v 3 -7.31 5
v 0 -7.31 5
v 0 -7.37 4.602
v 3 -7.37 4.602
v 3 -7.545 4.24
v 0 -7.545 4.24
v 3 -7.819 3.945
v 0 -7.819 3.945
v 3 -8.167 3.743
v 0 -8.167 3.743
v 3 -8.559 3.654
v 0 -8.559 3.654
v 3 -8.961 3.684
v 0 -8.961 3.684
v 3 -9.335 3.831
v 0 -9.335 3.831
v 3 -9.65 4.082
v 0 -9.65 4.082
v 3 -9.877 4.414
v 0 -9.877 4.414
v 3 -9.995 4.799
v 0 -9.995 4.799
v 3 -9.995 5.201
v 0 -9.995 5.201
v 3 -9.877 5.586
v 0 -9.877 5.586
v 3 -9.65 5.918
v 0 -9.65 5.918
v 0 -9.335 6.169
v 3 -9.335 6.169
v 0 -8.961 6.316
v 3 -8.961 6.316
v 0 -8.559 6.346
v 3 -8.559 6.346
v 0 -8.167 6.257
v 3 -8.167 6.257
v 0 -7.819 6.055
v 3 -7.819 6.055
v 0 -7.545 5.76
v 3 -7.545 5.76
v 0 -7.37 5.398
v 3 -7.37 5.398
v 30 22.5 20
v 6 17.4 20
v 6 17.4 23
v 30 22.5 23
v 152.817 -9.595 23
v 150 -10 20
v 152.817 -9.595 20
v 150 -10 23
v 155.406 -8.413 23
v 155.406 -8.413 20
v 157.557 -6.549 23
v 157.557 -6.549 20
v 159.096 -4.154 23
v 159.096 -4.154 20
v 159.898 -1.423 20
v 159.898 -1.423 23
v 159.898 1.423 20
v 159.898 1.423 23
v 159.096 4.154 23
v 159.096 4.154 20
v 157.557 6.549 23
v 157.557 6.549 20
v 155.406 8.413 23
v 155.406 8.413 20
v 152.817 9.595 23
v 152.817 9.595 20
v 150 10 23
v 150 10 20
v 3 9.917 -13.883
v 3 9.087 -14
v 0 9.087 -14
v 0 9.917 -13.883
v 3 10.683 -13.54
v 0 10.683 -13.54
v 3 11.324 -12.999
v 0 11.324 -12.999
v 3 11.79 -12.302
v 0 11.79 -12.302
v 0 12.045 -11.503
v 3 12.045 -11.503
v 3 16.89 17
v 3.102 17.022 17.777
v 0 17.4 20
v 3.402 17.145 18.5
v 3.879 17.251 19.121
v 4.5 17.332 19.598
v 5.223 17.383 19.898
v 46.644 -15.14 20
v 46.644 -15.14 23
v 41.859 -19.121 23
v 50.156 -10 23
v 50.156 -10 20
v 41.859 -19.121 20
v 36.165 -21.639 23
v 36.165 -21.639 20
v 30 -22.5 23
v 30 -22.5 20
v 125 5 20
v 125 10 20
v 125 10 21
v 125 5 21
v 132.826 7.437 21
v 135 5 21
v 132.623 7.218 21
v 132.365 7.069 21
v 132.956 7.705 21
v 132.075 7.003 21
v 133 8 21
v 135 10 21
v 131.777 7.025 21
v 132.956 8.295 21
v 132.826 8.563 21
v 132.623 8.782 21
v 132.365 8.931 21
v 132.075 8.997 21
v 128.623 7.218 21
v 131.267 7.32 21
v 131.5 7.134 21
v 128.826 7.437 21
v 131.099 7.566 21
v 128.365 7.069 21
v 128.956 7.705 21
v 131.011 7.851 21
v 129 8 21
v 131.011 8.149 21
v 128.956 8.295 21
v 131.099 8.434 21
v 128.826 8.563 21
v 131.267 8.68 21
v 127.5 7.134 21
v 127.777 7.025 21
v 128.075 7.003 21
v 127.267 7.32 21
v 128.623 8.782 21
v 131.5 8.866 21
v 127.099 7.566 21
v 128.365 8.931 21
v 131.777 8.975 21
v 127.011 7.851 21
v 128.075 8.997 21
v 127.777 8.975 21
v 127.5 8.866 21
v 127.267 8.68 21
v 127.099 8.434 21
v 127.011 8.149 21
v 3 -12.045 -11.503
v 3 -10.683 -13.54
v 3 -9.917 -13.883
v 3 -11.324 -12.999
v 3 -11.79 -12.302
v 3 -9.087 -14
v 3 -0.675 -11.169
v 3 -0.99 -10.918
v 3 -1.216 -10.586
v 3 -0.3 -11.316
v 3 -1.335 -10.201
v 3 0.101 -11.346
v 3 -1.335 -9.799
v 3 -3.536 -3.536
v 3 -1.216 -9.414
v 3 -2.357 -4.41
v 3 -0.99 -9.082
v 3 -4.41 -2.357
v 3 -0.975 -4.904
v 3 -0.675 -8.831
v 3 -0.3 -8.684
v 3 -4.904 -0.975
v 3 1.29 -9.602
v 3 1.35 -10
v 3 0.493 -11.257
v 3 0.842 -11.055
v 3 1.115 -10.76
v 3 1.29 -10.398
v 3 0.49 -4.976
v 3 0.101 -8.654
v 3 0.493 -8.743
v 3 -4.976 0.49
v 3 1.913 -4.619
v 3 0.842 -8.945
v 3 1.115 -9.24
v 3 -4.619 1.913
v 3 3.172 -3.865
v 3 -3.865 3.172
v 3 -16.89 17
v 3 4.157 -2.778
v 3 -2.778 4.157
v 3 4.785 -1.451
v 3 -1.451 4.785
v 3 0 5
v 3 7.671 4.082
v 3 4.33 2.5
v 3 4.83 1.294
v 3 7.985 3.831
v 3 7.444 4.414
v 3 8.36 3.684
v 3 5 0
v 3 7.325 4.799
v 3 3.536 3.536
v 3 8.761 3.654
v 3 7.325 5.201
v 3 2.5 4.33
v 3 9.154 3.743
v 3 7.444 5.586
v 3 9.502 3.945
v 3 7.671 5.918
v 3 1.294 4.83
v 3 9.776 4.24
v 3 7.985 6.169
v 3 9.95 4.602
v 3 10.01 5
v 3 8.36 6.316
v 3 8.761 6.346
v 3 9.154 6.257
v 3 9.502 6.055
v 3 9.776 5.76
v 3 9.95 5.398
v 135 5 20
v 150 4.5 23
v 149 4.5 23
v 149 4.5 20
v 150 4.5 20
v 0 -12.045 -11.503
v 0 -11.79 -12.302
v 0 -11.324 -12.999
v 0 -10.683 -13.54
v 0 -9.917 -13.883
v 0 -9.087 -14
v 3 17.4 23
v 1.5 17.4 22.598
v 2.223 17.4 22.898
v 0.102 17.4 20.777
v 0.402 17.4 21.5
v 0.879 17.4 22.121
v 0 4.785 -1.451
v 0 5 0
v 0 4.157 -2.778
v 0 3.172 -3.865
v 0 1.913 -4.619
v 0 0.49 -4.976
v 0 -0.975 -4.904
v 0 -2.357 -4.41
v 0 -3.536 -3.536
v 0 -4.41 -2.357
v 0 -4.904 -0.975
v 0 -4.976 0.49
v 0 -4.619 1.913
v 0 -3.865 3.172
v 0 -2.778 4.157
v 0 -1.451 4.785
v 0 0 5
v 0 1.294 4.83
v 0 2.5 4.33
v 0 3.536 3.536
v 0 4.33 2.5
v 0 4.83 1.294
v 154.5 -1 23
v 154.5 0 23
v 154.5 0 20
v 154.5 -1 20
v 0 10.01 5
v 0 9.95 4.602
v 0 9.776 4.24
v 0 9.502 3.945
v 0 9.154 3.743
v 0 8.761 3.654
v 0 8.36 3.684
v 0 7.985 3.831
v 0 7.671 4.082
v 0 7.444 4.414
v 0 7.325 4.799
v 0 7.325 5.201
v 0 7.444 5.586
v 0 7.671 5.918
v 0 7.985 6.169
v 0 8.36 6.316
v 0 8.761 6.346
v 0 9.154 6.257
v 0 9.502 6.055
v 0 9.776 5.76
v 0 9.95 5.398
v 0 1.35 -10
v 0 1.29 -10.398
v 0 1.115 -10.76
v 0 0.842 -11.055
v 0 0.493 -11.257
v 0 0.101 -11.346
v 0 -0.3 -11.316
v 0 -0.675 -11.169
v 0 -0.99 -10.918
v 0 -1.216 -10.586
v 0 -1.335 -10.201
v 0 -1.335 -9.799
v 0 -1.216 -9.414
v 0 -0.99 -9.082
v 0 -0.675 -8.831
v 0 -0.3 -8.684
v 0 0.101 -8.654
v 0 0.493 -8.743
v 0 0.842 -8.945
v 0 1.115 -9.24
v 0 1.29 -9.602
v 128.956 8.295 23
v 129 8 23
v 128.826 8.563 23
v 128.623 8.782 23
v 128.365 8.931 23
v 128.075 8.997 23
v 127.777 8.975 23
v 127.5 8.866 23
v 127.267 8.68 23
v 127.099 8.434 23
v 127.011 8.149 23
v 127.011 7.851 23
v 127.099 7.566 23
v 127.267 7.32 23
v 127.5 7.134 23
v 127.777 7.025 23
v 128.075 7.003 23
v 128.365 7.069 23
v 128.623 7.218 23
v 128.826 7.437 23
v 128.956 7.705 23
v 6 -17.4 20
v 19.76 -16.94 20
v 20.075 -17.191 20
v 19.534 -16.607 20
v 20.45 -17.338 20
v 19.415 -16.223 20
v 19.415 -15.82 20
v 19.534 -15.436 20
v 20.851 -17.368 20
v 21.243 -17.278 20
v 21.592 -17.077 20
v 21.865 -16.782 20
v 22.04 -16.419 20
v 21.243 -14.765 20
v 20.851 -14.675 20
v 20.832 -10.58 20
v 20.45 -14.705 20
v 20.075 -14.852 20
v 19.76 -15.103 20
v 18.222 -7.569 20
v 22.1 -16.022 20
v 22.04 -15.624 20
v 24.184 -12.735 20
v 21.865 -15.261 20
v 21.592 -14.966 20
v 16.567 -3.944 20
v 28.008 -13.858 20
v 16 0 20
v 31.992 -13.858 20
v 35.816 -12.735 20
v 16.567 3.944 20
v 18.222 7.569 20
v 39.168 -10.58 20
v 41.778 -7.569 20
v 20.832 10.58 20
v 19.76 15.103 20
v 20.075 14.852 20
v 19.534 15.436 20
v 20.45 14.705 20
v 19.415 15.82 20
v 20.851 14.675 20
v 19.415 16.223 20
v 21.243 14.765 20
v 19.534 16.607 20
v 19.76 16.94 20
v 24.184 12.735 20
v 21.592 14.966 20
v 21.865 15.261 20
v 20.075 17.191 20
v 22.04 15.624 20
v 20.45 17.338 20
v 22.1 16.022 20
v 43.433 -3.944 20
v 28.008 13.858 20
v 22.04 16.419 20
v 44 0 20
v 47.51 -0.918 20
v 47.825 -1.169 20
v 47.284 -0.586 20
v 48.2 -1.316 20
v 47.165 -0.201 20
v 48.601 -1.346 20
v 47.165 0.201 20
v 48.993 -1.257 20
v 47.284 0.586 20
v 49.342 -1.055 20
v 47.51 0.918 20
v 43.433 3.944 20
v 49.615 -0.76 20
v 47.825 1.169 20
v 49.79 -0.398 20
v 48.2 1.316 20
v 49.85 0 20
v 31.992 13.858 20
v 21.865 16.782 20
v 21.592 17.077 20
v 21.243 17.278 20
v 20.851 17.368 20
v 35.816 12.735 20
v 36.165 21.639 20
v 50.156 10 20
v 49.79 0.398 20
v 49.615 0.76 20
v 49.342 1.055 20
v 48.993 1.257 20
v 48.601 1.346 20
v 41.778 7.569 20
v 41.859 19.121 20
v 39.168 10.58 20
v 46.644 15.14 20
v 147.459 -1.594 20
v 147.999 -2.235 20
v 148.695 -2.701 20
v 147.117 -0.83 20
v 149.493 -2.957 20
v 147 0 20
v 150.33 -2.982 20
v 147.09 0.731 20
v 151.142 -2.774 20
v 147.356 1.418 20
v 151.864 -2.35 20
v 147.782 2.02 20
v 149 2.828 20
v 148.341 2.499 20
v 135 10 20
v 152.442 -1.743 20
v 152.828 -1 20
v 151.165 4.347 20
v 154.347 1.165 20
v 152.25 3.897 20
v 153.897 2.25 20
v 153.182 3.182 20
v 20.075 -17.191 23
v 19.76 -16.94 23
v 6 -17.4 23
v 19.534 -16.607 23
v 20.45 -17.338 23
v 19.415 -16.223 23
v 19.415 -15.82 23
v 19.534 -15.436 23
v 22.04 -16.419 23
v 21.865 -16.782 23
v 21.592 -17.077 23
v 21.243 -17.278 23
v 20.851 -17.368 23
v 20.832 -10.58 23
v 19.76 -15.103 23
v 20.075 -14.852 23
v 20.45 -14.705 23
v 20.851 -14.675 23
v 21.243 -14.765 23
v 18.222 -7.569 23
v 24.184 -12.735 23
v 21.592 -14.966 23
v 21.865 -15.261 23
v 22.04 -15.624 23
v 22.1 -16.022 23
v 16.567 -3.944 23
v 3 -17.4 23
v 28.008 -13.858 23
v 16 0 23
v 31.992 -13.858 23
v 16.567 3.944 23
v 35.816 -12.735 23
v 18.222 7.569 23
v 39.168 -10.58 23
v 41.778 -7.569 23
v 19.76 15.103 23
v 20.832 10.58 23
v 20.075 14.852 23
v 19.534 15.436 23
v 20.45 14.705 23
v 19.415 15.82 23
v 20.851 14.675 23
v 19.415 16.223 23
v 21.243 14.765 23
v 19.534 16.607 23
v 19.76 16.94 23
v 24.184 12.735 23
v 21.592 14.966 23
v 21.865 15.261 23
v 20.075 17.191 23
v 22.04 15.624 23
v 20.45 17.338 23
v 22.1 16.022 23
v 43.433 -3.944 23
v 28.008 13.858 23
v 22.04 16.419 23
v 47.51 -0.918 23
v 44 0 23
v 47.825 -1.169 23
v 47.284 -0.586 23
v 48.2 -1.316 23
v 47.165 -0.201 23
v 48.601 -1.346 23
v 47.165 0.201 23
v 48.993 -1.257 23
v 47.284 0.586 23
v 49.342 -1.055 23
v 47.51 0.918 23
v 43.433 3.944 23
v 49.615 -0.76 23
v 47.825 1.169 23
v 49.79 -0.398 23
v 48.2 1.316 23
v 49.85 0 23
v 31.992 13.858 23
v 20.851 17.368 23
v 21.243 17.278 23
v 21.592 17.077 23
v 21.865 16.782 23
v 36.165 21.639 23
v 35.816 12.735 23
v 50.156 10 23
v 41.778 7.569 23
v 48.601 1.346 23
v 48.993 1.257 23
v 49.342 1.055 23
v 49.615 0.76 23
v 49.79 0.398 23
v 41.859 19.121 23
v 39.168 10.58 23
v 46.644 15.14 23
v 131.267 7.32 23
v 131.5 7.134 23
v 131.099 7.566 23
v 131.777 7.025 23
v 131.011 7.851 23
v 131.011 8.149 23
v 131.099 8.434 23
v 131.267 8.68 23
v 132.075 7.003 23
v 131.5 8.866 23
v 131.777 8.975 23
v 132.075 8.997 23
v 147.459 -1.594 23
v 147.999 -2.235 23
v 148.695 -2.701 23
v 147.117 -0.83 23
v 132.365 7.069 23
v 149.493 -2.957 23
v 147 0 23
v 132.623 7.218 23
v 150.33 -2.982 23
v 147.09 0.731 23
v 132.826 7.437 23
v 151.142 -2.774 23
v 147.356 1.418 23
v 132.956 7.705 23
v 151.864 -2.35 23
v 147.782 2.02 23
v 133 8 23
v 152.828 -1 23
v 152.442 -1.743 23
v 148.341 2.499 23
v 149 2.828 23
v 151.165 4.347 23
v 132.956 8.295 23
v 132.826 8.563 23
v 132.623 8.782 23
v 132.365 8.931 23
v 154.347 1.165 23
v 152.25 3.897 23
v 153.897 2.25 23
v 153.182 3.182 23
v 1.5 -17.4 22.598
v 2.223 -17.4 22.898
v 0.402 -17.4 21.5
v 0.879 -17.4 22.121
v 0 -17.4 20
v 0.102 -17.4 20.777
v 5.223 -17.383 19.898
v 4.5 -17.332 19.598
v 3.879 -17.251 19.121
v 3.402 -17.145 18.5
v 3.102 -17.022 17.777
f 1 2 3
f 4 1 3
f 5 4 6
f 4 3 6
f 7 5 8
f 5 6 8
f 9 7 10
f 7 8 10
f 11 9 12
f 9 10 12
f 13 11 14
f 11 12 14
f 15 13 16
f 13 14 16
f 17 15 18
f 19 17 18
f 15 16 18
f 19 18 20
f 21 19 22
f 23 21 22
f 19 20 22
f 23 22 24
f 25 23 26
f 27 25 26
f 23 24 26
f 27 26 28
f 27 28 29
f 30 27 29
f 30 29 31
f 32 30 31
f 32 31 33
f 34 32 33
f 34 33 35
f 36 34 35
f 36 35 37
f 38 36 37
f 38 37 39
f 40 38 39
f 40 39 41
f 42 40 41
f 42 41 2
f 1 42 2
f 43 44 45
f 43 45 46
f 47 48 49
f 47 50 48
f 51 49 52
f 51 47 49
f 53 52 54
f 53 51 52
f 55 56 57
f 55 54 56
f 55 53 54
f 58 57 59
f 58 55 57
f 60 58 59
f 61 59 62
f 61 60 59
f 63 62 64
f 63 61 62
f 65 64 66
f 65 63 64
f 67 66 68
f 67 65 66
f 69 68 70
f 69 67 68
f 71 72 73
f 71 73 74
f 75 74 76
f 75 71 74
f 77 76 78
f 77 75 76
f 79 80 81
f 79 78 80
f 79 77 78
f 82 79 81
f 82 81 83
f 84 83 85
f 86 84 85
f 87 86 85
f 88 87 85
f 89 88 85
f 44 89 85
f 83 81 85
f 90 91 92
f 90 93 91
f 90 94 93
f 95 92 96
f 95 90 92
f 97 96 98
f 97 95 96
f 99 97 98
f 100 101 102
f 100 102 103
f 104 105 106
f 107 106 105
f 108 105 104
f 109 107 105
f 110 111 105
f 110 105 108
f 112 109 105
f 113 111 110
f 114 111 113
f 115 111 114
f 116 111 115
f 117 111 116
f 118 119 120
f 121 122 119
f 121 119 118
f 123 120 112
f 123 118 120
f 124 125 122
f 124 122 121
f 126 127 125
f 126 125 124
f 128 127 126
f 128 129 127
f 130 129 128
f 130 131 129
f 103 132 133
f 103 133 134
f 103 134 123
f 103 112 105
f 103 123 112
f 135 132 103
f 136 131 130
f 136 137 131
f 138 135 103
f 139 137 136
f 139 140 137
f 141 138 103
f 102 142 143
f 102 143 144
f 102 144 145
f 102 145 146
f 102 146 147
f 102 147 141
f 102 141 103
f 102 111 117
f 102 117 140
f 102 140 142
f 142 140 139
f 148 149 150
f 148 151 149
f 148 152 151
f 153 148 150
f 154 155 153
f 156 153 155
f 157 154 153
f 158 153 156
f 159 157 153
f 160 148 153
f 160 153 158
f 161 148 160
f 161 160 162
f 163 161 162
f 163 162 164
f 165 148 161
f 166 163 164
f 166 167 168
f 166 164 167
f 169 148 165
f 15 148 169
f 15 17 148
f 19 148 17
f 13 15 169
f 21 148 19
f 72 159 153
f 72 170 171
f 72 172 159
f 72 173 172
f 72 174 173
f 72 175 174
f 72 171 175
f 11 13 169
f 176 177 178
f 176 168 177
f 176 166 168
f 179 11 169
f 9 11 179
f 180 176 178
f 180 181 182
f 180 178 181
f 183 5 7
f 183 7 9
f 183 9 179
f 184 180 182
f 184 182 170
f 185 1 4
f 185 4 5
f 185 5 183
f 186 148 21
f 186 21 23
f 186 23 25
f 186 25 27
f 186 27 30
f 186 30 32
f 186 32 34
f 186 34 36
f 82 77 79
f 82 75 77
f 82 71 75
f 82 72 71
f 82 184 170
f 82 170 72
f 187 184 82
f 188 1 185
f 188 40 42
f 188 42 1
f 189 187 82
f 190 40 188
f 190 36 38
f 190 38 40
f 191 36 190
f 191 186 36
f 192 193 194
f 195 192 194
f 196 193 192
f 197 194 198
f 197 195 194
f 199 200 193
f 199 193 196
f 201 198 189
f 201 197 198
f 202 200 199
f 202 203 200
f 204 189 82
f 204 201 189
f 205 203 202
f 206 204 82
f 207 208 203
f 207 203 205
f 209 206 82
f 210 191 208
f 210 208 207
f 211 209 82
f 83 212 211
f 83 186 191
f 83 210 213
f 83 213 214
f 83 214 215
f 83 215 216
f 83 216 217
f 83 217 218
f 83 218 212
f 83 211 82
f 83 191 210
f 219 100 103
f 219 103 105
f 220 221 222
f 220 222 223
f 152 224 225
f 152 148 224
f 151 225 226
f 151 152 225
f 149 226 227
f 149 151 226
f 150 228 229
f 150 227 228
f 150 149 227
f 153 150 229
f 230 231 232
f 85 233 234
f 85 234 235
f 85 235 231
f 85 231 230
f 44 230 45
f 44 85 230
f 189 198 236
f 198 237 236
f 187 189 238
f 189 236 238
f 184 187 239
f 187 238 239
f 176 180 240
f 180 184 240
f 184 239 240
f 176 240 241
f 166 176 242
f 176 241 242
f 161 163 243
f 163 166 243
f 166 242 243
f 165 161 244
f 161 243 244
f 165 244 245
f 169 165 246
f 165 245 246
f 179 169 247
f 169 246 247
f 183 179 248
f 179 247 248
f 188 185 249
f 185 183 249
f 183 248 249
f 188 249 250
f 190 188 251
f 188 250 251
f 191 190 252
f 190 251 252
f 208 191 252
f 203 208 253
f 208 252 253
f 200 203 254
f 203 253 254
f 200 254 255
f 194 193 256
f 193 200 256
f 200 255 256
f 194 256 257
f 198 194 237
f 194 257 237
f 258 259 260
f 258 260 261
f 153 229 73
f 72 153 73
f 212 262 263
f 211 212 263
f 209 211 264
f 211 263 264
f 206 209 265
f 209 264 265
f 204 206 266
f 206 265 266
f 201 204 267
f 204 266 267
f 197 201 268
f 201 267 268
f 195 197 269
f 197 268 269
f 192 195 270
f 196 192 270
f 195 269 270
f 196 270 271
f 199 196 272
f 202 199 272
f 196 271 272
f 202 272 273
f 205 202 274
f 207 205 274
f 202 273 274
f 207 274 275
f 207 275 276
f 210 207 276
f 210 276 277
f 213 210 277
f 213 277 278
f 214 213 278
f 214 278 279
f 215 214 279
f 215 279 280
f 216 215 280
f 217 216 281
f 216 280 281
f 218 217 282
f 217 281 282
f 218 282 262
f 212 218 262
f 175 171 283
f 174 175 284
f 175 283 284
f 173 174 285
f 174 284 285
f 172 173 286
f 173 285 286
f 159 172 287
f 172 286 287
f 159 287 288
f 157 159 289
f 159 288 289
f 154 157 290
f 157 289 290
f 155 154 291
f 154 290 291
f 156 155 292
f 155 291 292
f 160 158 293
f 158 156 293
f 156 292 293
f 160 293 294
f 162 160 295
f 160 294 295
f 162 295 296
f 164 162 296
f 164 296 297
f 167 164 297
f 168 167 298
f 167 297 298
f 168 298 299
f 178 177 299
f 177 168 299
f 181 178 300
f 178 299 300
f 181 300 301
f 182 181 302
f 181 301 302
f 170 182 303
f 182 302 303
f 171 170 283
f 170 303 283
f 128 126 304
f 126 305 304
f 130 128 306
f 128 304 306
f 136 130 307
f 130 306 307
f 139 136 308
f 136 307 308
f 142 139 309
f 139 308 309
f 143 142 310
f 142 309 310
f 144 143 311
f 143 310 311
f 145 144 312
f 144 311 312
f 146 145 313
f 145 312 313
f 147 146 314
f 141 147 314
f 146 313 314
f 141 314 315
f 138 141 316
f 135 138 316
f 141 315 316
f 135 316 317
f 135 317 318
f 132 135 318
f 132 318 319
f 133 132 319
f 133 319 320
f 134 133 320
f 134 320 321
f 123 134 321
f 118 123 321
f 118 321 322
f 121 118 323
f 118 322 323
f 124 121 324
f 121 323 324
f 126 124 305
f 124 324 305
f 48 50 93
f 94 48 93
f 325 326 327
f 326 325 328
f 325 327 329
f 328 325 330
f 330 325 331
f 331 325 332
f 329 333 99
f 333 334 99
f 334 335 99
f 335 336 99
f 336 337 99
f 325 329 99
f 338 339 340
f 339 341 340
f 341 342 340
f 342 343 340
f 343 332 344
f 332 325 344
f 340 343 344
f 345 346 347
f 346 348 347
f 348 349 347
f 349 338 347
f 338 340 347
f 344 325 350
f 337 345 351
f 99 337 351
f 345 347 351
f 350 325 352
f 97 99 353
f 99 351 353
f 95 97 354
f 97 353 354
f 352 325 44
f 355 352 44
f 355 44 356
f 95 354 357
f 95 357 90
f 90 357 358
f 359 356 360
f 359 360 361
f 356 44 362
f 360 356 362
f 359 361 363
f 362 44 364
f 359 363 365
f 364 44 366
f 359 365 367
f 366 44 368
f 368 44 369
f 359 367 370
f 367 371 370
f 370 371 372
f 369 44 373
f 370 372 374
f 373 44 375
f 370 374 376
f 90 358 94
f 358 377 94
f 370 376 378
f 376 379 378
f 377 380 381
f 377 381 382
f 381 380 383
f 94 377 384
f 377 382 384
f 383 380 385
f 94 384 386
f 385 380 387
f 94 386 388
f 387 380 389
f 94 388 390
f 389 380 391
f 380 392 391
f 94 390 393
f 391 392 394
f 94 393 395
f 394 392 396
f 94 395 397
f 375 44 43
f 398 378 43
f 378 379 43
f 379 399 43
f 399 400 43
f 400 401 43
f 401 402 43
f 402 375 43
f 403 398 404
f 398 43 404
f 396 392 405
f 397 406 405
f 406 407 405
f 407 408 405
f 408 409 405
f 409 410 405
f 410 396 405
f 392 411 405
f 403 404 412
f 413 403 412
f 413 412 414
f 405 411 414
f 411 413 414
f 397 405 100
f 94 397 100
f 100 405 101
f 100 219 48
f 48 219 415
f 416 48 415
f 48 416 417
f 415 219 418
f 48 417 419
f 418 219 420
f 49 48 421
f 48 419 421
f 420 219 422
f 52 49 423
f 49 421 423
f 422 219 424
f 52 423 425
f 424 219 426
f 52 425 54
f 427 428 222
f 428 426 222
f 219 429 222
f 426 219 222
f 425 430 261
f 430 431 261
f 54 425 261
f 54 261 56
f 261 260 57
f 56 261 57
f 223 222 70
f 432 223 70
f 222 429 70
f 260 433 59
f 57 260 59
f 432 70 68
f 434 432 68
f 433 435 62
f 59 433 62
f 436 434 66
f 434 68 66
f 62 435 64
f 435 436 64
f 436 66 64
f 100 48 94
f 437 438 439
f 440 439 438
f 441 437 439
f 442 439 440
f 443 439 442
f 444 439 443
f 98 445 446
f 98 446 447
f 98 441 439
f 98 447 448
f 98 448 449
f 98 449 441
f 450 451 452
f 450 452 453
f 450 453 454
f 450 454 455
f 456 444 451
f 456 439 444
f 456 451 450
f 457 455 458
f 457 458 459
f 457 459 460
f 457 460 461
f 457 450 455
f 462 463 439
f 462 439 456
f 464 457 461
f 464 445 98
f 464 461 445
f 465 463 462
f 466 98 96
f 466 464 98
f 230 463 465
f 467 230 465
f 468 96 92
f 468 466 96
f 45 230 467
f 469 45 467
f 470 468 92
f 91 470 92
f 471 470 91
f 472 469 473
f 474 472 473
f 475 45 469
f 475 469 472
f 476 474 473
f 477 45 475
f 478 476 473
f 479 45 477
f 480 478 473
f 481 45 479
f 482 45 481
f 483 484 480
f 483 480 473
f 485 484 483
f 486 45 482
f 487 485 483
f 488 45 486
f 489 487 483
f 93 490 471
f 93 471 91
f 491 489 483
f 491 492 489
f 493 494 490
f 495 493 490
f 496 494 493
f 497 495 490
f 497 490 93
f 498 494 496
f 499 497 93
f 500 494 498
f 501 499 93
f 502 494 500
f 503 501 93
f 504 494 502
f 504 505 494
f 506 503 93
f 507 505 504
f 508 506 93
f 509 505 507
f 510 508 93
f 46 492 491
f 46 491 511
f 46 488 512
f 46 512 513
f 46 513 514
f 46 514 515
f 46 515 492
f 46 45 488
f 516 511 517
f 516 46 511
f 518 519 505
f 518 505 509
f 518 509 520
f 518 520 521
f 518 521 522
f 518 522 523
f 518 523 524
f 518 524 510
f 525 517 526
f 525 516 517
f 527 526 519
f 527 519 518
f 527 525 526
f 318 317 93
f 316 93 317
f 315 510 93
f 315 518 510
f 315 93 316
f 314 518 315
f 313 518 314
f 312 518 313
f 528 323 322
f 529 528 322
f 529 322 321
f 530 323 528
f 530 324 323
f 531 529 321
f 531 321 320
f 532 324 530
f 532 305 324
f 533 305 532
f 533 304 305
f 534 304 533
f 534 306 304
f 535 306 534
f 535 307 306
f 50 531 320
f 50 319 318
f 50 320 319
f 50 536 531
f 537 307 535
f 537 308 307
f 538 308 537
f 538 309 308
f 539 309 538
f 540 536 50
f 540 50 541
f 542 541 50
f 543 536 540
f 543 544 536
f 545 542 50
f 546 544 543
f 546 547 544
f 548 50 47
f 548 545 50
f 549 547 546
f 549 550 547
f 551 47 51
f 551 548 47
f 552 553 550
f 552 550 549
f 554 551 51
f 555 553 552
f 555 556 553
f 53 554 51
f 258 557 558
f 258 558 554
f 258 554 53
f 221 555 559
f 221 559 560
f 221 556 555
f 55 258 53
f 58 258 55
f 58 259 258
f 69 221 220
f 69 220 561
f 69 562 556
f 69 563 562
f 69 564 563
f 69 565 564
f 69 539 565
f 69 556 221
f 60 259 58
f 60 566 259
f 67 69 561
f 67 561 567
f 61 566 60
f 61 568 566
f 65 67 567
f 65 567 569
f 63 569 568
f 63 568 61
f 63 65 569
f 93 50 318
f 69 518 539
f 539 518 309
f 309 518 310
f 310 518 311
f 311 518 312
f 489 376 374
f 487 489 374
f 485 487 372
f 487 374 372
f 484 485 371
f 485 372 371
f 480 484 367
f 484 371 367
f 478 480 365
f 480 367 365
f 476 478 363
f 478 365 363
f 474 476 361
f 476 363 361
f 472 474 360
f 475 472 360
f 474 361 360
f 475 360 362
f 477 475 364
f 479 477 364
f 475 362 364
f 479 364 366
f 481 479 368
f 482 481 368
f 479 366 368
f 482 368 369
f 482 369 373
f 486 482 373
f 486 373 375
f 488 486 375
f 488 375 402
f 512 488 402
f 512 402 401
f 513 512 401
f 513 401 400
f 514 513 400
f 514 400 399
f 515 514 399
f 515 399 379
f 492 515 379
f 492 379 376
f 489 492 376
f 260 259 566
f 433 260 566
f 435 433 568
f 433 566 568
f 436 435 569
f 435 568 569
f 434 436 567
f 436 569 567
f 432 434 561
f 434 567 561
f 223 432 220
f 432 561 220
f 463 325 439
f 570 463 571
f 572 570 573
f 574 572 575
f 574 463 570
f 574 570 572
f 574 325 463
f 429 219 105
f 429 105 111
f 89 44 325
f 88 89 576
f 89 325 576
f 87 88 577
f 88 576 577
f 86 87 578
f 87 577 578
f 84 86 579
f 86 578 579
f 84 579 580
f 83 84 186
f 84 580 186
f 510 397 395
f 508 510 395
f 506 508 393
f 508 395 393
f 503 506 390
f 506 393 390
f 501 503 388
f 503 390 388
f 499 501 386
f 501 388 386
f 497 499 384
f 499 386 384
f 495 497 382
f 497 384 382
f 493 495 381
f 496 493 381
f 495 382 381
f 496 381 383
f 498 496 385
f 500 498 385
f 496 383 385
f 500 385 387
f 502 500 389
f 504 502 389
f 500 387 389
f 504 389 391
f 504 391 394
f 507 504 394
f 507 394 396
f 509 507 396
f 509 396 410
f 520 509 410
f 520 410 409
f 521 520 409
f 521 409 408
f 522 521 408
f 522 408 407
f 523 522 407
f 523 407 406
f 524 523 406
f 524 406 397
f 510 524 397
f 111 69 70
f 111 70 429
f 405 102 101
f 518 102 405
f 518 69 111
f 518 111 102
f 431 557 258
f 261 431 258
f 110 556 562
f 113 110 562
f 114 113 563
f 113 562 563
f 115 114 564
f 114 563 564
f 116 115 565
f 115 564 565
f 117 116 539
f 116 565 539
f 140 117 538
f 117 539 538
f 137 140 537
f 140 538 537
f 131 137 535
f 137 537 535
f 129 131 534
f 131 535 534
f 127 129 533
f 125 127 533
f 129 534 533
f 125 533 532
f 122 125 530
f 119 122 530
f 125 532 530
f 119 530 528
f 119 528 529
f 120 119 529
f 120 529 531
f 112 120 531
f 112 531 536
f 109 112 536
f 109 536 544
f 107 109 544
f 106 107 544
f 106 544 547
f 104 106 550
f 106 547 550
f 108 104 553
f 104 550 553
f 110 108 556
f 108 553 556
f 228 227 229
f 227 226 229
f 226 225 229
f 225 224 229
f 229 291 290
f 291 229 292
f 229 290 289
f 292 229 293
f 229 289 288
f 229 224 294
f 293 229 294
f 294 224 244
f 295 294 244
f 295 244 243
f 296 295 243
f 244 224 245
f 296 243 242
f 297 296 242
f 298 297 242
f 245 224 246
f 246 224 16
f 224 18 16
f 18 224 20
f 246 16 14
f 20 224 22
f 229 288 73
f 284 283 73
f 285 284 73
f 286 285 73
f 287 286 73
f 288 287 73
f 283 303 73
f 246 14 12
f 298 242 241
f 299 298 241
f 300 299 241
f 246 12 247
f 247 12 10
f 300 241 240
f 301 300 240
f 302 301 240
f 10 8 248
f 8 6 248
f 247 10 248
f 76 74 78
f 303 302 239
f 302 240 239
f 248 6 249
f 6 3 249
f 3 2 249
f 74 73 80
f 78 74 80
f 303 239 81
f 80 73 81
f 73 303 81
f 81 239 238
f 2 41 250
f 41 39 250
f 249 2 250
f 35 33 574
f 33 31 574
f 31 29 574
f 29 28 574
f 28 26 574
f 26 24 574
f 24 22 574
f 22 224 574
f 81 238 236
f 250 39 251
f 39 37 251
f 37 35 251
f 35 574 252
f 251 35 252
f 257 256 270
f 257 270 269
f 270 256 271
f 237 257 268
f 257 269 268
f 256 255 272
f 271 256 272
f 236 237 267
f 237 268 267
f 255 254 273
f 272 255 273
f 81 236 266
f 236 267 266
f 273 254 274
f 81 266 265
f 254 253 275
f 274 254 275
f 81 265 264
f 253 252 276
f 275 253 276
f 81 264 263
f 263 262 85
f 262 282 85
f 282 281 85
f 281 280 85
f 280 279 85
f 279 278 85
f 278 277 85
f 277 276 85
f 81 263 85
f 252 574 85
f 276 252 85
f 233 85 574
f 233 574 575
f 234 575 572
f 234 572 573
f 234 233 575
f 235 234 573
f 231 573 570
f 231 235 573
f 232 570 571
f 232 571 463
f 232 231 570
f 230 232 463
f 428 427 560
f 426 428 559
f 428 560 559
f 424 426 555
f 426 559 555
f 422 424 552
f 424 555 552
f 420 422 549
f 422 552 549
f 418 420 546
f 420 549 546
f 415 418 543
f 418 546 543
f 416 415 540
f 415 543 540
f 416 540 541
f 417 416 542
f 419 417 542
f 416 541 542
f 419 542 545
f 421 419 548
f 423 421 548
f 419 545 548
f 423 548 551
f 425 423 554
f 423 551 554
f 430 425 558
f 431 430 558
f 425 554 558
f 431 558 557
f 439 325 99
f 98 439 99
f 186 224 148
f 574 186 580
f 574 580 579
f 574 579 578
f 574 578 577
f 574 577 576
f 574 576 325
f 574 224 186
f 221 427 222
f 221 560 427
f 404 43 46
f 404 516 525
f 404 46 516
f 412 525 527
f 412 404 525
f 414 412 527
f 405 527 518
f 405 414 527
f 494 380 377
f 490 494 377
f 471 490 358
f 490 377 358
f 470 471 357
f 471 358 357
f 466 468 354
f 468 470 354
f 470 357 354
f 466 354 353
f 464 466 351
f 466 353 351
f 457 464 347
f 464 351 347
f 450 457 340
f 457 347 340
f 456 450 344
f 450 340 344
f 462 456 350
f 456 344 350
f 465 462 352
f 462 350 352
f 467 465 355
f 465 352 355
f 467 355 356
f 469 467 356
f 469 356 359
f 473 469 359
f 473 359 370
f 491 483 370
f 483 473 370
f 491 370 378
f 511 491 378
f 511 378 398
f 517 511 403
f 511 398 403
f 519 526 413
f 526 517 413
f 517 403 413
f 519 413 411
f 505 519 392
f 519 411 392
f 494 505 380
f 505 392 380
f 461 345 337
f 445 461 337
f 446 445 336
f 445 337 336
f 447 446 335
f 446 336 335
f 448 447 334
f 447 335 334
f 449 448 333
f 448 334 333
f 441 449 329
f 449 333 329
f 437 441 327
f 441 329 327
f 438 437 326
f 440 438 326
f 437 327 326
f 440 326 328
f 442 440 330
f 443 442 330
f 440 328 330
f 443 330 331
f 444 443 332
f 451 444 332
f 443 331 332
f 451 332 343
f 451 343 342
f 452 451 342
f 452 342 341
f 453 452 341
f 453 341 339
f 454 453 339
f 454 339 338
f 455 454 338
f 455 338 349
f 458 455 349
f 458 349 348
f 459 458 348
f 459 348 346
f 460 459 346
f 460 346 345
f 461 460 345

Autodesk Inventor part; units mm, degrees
ref_plane "YZ Plane" through (0, 0, 0) normal (1, 0, 0) x (0, 1, 0)
ref_plane "XZ Plane" through (0, 0, 0) normal (0, 1, 0) x (-1, 0, 0)
ref_plane "XY Plane" through (0, 0, 0) normal (0, 0, 1) x (1, 0, 0)
sketch "スケッチ1" plane through (0, 0, 0) normal (1, 0, 0) x (0, 1, 0)
  circle A0 centre (0, 0) radius 10
  circle A1 centre (0, -10) radius 1.35
  circle A2 centre (8.6603, 5) radius 1.35
  circle A3 centre (-8.6603, 5) radius 1.35
  circle A4 centre (0, 0) radius 5
  line L0 (0, 0) -> (0, 50)
  circle A5 centre (0, 50) radius 22.5
  circle A6 centre (0, 0) radius 14
  line L1 (-14, 0) -> (-22.5, 50)
  line L2 (14, 0) -> (22.5, 50)
  line L3 (0, -14) -> (-11.62, -14)
  line L4 (-11.62, -14) -> (-14, 0)
  line L5 (0, -14) -> (11.62, -14)
  line L6 (11.62, -14) -> (14, 0)
  line L7 (0, 20) -> (-17.4, 20)
  line L8 (0, 20) -> (17.4, 20)
  dimension "d0" = 20
  dimension "d1" = 2.7
  dimension "d4" = 360
  dimension "d6" = 10
  dimension "d7" = 50
  dimension "d8" = 45
  dimension "d9" = 28
extrude "押し出し1" add sketch "スケッチ1" along normal blind 3 contours A0 A1 A3 A2 | A6 L6 L4 | A6 L1 L7 L0 | L0 L8 L2 A6 | L6 L5 A6 | A6 L3 L4
sketch "スケッチ2" plane through (0, -17.4, 20) normal (0, 0, 1) x (1, 0, 0)
  line L0 (0, 17.4) -> (30, 17.4)
  circle A0 centre (30, 17.4) radius 22.5
  circle A1 centre (30, 17.4) radius 18.5
  circle A2 centre (30, 17.4) radius 14
  circle A3 centre (48.5, 17.4) radius 1.35
  circle A4 centre (20.75, 33.4215) radius 1.35
  circle A5 centre (20.75, 1.3785) radius 1.35
  line L1 (0, 29.02) -> (0, 34.8) projected
  line L2 (0, 0) -> (0, 5.78) projected
  line L3 (0, 34.8) -> (0, 0)
  line L4 (3, 29.02) -> (3, 34.8) projected
  line L5 (3, 34.8) -> (6, 34.8)
  line L6 (6, 34.8) -> (30, 39.9)
  line L7 (3, 0) -> (3, 5.78) projected
  line L8 (3, 0) -> (6, 0)
  line L9 (6, 0) -> (30, -5.1)
  line L10 (3, 0) -> (0, 0)
  line L11 (0, 34.8) -> (3, 34.8) projected
  line L12 (0, 0) -> (0, 34.8)
  line L13 (0, 34.8) -> (3, 34.8)
  dimension "d14" = 37
  dimension "d12" = 30
  dimension "d13" = 45
  dimension "d15" = 28
  dimension "d16" = 2.7
  dimension "d19" = 360
  dimension "d21" = 3
  dimension "d22" = 3
extrude "押し出し2" add sketch "スケッチ2" along normal blind 3 contours L3 L1 L11 L5 L6 A0 L0 | L0 A0 L9 L8 L10 L2 L3 | A1 A4 A3 A5 | A0 L6 L9
fillet "フィレット1" radius 3 2 edges at (3, 0, 20) (0, 0, 23)
fillet "フィレット2" radius 3 2 edges at (1.5, -11.62, -14) (1.5, 11.62, -14)
sketch "スケッチ3" plane through (0, -17.4, 23) normal (0, 0, 1) x (1, 0, 0)
  arc A0 (30, -5.1) -> (30, 39.9) centre (30, 17.4) ccw projected
  line L0 (30, 17.4) -> (150, 17.4)
  circle A1 centre (150, 17.4) radius 10
  line L1 (150, 27.4) -> (50.1556, 27.4)
  line L2 (150, 7.4) -> (50.1556, 7.4)
  circle A2 centre (150, 17.4) radius 3
  line L3 (150, 17.4) -> (150, 16.4)
  line L4 (150, 16.4) -> (154.5, 16.4)
  line L5 (150, 17.4) -> (149, 17.4)
  line L6 (149, 17.4) -> (149, 21.9)
  arc A3 (154.5, 16.4) -> (149, 21.9) centre (149.3141, 16.7141) ccw
  point P0 (0, 17.4)
  dimension "d27" = 120
  dimension "d28" = 20
  dimension "d29" = 6
  dimension "d32" = 1
  dimension "d33" = 4.5
  dimension "d34" = 1
  dimension "d35" = 4.5
extrude "押し出し3" add sketch "スケッチ3" against normal blind 3 contours A0 L0 A1 L2 | A0 L1 A1 L0 | A1 | L6 A3 L4 A2
sketch "スケッチ4" plane through (0, -17.4, 23) normal (0, 0, 1) x (1, 0, 0)
  circle A0 centre (150, 17.4) radius 3 projected
  line L0 (150, 17.4) -> (150, 16.4)
  line L1 (150, 16.4) -> (154.5, 16.4)
  line L2 (150, 17.4) -> (154.5, 17.4)
  line L3 (150, 17.4) -> (149, 17.4)
  line L4 (149, 17.4) -> (149, 21.9)
  line L5 (150, 17.4) -> (150, 21.9)
  line L6 (149, 21.9) -> (150, 21.9)
  line L7 (154.5, 17.4) -> (154.5, 16.4)
  arc A1 (154.5, 17.4) -> (150, 21.9) centre (150, 17.4) ccw
  point P0 (0, 17.4)
  point P1 (149, 20.2284)
  point P2 (152.8284, 16.4)
  dimension "d36" = 1
  dimension "d37" = 4.5
  dimension "d38" = 1
  dimension "d39" = 4.5
extrude "押し出し4" cut sketch "スケッチ4" against normal blind 3 contours L2 L7 L1 A0 | A0 L5 A1 L2 | A0 L4 L6 L5
sketch "スケッチ5" plane through (0, -17.4, 23) normal (0, 0, 1) x (1, 0, 0)
  circle A0 centre (132, 25.4) radius 1
  circle A1 centre (128, 25.4) radius 1
  point P0 (0, 17.4)
  dimension "d42" = 2
  dimension "d43" = 2
extrude "押し出し5" cut sketch "スケッチ5" against normal blind 3
thread "ねじ1" size "M2x0.4" class "6H" standard "ANSI Metric M Profile" full length
thread "ねじ2" size "M2x0.4" class "6H" standard "ANSI Metric M Profile" full length
sketch "スケッチ6" plane through (0, -17.4, 20) normal (0, 0, -1) x (-1, 0, 0)
  line L0 (-50.1556, 27.4) -> (-150, 27.4) projected
  line L1 (-130, 27.4) -> (-125, 27.4)
  line L2 (-125, 27.4) -> (-125, 22.4)
  line L3 (-125, 22.4) -> (-135, 22.4)
  line L4 (-135, 22.4) -> (-135, 27.4)
  line L5 (-135, 27.4) -> (-130, 27.4)
  point P0 (0, 17.4)
  dimension "d50" = 5
  dimension "d51" = 5
  dimension "d52" = 10
extrude "押し出し6" cut sketch "スケッチ6" against normal blind 1
properties part number "motor_holder_1" material "アルミニウム 6061"
